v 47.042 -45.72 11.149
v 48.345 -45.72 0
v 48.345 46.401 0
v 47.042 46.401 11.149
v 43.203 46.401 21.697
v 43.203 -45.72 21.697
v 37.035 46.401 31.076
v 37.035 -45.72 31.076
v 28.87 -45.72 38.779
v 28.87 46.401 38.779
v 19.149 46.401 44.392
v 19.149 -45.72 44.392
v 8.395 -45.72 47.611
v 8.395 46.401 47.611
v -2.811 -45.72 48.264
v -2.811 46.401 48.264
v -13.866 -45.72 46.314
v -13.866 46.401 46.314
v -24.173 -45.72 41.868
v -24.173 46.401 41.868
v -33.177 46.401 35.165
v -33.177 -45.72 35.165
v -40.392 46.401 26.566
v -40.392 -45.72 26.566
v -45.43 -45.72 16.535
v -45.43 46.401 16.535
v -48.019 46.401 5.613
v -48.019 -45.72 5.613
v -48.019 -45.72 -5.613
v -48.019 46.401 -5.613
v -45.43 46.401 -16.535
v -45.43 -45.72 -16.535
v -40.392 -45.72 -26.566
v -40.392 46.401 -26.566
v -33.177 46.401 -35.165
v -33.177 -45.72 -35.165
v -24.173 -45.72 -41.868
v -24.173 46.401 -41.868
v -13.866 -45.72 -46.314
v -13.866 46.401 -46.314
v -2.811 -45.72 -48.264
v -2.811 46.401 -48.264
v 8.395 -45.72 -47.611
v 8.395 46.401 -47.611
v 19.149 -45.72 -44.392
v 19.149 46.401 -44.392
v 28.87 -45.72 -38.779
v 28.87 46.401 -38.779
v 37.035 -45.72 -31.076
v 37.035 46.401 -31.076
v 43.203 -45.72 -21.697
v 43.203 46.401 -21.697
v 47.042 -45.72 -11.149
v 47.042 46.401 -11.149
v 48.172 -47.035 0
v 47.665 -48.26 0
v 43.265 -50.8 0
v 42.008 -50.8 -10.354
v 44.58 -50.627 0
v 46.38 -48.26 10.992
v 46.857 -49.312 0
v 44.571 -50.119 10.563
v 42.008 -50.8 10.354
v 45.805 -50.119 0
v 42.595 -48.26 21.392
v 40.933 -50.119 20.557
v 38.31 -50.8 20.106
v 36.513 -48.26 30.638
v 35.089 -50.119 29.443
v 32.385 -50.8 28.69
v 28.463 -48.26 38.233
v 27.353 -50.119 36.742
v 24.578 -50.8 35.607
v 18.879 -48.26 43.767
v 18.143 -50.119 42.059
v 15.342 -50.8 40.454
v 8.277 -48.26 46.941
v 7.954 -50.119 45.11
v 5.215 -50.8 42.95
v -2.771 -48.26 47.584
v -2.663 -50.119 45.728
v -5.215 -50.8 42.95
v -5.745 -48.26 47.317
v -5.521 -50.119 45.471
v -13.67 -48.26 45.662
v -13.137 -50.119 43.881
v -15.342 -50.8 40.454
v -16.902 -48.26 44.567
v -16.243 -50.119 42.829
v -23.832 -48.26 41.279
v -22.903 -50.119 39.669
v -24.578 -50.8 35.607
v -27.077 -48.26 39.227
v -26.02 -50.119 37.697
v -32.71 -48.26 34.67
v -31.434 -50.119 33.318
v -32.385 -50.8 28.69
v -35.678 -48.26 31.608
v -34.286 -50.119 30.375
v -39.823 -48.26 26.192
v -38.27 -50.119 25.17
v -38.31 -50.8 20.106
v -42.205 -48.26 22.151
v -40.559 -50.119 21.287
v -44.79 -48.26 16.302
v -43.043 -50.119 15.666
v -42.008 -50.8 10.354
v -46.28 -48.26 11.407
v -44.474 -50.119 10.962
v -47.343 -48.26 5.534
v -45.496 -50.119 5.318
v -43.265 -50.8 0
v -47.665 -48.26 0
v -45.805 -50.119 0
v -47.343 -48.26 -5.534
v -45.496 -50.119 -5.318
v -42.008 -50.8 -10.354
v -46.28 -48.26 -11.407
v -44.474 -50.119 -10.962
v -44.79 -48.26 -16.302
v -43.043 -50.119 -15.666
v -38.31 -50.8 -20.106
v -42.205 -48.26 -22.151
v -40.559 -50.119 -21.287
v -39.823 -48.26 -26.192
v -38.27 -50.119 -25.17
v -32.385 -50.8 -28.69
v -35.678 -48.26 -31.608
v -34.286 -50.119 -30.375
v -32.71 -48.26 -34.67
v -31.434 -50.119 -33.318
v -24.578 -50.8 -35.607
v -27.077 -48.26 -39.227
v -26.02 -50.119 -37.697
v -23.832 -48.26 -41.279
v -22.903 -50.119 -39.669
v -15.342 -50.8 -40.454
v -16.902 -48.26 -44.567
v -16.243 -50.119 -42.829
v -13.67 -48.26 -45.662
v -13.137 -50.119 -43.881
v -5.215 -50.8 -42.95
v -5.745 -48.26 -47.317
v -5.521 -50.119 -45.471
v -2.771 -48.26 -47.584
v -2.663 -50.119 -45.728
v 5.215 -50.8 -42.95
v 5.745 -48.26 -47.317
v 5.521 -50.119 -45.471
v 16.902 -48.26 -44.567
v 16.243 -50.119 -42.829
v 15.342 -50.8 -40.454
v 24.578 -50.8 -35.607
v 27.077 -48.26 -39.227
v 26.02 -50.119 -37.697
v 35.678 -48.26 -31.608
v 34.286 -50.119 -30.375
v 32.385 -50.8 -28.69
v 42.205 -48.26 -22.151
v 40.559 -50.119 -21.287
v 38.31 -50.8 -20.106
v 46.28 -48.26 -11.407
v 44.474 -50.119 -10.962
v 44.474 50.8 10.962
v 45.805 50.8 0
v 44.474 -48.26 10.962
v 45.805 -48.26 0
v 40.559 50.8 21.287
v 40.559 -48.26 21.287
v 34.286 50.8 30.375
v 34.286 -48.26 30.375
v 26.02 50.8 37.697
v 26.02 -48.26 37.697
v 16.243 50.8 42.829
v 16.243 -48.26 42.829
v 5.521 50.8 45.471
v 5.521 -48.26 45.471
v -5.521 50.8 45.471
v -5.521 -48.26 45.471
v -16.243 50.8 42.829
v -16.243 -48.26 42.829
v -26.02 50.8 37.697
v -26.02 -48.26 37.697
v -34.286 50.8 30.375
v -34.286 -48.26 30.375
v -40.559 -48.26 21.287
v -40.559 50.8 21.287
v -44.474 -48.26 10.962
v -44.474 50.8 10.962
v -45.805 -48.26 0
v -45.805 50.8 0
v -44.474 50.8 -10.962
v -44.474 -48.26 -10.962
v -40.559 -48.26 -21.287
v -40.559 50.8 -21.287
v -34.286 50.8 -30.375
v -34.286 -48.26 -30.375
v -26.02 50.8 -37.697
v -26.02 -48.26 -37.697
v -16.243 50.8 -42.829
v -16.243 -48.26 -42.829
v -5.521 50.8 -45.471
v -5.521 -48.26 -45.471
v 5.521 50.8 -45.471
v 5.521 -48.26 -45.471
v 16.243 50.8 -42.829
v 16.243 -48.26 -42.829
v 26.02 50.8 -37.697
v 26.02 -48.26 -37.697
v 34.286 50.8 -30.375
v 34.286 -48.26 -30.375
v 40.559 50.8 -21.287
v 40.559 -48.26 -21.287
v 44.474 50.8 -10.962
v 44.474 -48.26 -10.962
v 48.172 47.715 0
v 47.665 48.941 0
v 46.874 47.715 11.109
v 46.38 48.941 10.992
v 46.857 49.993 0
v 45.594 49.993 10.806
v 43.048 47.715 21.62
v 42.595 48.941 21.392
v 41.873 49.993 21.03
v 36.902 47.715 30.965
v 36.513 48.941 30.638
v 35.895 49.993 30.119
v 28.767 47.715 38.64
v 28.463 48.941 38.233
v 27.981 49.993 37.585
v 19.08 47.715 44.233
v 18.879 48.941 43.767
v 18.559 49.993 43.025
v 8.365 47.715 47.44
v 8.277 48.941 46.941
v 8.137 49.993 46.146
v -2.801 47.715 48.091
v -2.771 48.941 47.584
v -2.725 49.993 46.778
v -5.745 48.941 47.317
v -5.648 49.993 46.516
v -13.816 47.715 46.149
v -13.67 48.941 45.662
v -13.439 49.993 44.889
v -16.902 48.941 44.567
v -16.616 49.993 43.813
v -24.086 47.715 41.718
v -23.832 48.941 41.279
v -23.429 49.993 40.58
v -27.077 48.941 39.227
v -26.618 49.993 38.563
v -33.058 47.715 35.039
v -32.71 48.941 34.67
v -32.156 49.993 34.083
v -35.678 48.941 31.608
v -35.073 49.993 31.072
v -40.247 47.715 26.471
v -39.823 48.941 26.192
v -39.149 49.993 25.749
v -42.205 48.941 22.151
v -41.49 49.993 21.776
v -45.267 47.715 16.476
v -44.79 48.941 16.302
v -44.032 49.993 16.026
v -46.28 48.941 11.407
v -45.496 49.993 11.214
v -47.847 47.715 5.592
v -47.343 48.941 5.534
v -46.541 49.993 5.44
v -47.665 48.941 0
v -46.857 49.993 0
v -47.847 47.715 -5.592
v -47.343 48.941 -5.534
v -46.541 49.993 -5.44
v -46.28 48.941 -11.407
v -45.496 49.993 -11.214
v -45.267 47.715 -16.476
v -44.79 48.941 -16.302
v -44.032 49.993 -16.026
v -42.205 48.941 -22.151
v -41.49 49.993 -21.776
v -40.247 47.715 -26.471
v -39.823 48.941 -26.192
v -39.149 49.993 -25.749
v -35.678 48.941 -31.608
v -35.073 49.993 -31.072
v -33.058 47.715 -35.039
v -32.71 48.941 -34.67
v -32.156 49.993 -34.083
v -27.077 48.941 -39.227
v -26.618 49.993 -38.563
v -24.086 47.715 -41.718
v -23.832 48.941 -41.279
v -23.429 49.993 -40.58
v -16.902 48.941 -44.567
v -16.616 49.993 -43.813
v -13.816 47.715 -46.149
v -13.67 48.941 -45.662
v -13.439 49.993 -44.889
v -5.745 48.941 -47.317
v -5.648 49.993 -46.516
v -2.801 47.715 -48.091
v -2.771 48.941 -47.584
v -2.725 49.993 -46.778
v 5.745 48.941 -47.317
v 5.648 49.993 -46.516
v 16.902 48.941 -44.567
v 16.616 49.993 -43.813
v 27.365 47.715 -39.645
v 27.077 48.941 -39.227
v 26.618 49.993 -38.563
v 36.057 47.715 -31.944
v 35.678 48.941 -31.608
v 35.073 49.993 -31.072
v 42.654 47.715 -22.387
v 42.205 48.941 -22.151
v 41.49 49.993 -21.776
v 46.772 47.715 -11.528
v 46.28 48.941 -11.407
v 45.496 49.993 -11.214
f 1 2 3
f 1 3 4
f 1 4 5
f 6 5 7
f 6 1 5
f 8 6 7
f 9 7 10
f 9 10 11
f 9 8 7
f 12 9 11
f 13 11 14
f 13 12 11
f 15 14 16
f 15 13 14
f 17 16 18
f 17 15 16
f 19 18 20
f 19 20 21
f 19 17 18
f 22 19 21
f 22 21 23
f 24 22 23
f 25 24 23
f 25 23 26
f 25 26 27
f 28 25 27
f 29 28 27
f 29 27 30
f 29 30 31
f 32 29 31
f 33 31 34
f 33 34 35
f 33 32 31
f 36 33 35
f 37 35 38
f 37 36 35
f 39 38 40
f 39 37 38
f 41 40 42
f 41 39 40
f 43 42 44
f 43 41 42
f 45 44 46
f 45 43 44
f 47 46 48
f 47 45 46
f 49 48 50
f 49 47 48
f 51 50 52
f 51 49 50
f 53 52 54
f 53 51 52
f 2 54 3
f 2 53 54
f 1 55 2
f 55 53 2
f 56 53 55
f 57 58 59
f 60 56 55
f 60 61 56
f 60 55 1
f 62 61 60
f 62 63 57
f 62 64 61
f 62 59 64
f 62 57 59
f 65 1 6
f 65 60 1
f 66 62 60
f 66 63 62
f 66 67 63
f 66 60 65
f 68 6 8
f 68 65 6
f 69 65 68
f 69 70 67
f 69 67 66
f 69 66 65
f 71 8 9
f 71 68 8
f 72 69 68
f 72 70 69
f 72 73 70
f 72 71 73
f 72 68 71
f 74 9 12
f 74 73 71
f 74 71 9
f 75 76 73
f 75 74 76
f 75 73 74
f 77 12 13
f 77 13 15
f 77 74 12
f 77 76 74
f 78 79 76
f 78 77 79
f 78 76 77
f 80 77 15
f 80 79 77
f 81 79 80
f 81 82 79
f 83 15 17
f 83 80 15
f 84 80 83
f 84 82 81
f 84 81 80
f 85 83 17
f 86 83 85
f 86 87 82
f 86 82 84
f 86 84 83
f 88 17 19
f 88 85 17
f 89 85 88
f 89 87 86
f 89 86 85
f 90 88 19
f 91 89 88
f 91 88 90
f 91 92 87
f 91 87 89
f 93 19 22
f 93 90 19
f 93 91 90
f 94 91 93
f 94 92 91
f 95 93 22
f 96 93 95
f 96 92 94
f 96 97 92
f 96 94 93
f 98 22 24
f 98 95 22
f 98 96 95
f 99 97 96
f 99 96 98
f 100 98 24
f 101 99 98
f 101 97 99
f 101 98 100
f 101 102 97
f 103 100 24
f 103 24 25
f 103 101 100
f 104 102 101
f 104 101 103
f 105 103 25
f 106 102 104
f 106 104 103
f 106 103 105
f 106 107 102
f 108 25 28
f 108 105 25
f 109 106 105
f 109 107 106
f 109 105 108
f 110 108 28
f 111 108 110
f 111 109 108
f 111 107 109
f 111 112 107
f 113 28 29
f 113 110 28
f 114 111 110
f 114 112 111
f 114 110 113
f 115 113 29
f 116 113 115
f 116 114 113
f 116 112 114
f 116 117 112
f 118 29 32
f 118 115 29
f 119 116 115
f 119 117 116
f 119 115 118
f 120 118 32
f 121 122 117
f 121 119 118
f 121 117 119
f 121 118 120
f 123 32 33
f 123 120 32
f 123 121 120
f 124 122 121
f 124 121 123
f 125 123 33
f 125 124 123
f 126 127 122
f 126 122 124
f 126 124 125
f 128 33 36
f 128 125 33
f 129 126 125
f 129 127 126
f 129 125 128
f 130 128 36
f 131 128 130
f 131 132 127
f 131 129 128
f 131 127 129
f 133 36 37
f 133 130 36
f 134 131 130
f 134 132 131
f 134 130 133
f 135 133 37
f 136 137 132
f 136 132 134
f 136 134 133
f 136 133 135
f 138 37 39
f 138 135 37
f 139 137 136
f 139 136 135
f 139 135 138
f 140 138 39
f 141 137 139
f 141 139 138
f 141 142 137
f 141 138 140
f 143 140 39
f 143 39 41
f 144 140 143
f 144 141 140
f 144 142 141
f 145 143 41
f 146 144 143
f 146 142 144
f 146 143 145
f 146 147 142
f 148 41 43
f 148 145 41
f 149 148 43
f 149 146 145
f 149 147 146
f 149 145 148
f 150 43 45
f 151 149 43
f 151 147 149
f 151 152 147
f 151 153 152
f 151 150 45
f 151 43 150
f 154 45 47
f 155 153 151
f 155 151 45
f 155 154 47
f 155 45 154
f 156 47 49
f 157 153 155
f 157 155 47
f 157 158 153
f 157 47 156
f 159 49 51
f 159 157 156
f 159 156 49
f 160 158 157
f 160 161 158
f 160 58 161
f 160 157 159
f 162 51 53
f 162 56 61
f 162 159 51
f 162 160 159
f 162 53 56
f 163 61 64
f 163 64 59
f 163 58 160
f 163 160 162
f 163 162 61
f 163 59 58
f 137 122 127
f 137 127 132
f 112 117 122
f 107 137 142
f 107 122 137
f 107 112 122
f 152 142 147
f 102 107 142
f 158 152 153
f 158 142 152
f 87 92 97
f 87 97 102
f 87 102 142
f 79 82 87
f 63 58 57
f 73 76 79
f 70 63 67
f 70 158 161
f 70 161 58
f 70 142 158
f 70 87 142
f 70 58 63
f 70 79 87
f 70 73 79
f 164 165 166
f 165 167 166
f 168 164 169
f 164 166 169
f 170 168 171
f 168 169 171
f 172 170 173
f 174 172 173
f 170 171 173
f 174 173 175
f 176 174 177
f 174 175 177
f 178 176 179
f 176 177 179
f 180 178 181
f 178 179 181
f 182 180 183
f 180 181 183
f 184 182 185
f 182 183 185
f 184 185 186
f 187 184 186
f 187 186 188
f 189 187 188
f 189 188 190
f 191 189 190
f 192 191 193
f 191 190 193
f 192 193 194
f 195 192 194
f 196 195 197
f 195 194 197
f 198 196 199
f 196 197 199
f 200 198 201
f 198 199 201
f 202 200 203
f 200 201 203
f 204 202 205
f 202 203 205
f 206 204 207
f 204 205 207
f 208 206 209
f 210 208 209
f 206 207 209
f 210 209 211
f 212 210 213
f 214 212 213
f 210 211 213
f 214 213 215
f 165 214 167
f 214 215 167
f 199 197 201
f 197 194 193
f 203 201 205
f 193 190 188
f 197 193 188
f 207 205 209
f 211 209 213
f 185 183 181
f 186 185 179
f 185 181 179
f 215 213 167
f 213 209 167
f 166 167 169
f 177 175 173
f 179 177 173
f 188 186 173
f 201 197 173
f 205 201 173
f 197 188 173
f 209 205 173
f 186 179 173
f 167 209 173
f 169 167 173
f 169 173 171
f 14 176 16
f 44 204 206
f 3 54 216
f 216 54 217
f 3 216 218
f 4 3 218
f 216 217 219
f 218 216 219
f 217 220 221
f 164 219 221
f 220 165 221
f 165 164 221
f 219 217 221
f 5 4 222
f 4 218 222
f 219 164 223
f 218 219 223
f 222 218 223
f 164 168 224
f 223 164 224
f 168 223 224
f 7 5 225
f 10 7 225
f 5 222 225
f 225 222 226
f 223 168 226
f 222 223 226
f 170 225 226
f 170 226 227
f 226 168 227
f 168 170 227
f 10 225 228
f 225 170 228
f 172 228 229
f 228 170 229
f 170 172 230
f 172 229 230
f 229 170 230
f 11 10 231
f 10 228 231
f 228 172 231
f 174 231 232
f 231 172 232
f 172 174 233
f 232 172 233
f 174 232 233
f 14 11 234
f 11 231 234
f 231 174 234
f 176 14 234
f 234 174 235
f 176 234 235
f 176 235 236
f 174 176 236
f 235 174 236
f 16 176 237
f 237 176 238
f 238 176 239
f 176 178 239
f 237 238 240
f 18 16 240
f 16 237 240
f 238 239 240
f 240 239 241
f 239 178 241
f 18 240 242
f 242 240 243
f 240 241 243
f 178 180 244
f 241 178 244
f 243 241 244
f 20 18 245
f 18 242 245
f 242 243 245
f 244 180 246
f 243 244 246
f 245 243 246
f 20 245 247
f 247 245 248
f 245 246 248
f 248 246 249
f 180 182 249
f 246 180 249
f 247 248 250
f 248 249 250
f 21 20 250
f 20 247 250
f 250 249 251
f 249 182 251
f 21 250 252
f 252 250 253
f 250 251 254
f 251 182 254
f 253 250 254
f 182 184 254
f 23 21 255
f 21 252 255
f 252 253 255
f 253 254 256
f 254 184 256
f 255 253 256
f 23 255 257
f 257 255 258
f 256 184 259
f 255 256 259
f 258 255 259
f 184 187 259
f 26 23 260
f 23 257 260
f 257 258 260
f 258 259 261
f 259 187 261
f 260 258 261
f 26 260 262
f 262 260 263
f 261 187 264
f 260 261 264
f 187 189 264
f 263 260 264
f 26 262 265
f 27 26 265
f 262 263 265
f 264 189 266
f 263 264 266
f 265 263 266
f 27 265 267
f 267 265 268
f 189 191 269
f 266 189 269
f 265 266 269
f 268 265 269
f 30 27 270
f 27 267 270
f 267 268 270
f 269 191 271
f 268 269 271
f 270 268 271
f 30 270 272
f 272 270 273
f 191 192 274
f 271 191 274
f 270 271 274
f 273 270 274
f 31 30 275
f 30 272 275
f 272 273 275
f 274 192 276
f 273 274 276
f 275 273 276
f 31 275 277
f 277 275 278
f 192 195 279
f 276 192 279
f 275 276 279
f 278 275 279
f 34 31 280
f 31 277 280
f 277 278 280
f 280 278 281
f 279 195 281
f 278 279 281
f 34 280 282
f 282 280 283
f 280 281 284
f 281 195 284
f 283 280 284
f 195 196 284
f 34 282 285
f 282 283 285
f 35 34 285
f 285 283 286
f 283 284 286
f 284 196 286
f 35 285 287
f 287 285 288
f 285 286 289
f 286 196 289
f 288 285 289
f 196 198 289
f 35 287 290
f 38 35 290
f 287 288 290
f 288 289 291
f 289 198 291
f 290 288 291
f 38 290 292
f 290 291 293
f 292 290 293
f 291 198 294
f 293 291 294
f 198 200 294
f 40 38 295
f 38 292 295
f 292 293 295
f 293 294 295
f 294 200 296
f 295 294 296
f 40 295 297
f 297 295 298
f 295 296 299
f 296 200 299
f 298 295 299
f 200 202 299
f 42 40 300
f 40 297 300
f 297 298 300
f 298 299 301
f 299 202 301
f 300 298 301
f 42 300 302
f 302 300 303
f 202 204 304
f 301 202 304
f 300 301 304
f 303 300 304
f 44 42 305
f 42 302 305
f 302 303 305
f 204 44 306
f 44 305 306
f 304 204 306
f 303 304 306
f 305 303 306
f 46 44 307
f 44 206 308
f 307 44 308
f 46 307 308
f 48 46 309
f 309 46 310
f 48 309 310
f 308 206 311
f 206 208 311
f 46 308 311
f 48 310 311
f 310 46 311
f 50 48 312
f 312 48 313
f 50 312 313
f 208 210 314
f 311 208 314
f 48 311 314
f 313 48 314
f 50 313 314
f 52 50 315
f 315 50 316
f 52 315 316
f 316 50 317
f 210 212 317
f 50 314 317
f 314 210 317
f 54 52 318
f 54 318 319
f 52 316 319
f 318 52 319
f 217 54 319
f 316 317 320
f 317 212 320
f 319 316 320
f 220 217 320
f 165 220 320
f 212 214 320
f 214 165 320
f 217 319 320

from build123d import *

# Parameters (mm, degrees)
F0_R     = 48.3453961675
F1_DEPTH = 50.8
F2_T     = -2.54


# Not quite as in the source:
# - a fillet or chamfer that OpenCascade refuses, or shapes differently, is made with other operations: its cross-section is extruded or revolved along the edge and cut away or added


with BuildPart() as f1:
    # F0 (on Front) → F1 (new body, symmetric)
    with BuildSketch(Plane.XZ):
        Circle(F0_R)
    extrude(amount=F1_DEPTH, both=True)

    # F2
    f2_openings = [f1.faces().sort_by_distance(p)[0] for p in [
        (0, 50.8, 0),
    ]]
    offset(amount=F2_T, openings=f2_openings)

    # F3: fillet of radius 5.08 on 3 edges, made by hand

    # F3_s1 → F3_t2 (revolve, cut)
    with BuildSketch(Plane.XY):
        with BuildLine():
            ThreePointArc((48.3453961675, 46.4005909488), (47.6648052188, 48.9405909488), (45.8053961675, 50.8))
            Line((45.8053961675, 50.8), (45.8561961675, 50.887988181))
            ThreePointArc((45.8561961675, 50.887988181), (47.0753961675, 50.9016), (48.3453961675, 50.9016))
            Line((48.3453961675, 50.9016), (48.4469961675, 50.8))
            Line((48.4469961675, 50.8), (48.4469961675, 46.4005909488))
            Line((48.4469961675, 46.4005909488), (48.3453961675, 46.4005909488))
        make_face()
    revolve(axis=Axis((0, 50.8, 0), (0, -1, 0)), mode=Mode.SUBTRACT)

    # F3_s3 → F3_t4 (revolve, cut)
    with BuildSketch(Plane.XY):
        with BuildLine():
            ThreePointArc((48.3453961675, -45.72), (46.857498616, -49.3121024484), (43.2653961675, -50.8))
            Line((43.2653961675, -50.8), (43.2653961675, -50.9016))
            Line((43.2653961675, -50.9016), (48.4469961675, -50.9016))
            Line((48.4469961675, -50.9016), (48.4469961675, -45.72))
            Line((48.4469961675, -45.72), (48.3453961675, -45.72))
        make_face()
    revolve(axis=Axis((0, -50.8, 0), (0, -1, 0)), mode=Mode.SUBTRACT)


solid = f1.part
